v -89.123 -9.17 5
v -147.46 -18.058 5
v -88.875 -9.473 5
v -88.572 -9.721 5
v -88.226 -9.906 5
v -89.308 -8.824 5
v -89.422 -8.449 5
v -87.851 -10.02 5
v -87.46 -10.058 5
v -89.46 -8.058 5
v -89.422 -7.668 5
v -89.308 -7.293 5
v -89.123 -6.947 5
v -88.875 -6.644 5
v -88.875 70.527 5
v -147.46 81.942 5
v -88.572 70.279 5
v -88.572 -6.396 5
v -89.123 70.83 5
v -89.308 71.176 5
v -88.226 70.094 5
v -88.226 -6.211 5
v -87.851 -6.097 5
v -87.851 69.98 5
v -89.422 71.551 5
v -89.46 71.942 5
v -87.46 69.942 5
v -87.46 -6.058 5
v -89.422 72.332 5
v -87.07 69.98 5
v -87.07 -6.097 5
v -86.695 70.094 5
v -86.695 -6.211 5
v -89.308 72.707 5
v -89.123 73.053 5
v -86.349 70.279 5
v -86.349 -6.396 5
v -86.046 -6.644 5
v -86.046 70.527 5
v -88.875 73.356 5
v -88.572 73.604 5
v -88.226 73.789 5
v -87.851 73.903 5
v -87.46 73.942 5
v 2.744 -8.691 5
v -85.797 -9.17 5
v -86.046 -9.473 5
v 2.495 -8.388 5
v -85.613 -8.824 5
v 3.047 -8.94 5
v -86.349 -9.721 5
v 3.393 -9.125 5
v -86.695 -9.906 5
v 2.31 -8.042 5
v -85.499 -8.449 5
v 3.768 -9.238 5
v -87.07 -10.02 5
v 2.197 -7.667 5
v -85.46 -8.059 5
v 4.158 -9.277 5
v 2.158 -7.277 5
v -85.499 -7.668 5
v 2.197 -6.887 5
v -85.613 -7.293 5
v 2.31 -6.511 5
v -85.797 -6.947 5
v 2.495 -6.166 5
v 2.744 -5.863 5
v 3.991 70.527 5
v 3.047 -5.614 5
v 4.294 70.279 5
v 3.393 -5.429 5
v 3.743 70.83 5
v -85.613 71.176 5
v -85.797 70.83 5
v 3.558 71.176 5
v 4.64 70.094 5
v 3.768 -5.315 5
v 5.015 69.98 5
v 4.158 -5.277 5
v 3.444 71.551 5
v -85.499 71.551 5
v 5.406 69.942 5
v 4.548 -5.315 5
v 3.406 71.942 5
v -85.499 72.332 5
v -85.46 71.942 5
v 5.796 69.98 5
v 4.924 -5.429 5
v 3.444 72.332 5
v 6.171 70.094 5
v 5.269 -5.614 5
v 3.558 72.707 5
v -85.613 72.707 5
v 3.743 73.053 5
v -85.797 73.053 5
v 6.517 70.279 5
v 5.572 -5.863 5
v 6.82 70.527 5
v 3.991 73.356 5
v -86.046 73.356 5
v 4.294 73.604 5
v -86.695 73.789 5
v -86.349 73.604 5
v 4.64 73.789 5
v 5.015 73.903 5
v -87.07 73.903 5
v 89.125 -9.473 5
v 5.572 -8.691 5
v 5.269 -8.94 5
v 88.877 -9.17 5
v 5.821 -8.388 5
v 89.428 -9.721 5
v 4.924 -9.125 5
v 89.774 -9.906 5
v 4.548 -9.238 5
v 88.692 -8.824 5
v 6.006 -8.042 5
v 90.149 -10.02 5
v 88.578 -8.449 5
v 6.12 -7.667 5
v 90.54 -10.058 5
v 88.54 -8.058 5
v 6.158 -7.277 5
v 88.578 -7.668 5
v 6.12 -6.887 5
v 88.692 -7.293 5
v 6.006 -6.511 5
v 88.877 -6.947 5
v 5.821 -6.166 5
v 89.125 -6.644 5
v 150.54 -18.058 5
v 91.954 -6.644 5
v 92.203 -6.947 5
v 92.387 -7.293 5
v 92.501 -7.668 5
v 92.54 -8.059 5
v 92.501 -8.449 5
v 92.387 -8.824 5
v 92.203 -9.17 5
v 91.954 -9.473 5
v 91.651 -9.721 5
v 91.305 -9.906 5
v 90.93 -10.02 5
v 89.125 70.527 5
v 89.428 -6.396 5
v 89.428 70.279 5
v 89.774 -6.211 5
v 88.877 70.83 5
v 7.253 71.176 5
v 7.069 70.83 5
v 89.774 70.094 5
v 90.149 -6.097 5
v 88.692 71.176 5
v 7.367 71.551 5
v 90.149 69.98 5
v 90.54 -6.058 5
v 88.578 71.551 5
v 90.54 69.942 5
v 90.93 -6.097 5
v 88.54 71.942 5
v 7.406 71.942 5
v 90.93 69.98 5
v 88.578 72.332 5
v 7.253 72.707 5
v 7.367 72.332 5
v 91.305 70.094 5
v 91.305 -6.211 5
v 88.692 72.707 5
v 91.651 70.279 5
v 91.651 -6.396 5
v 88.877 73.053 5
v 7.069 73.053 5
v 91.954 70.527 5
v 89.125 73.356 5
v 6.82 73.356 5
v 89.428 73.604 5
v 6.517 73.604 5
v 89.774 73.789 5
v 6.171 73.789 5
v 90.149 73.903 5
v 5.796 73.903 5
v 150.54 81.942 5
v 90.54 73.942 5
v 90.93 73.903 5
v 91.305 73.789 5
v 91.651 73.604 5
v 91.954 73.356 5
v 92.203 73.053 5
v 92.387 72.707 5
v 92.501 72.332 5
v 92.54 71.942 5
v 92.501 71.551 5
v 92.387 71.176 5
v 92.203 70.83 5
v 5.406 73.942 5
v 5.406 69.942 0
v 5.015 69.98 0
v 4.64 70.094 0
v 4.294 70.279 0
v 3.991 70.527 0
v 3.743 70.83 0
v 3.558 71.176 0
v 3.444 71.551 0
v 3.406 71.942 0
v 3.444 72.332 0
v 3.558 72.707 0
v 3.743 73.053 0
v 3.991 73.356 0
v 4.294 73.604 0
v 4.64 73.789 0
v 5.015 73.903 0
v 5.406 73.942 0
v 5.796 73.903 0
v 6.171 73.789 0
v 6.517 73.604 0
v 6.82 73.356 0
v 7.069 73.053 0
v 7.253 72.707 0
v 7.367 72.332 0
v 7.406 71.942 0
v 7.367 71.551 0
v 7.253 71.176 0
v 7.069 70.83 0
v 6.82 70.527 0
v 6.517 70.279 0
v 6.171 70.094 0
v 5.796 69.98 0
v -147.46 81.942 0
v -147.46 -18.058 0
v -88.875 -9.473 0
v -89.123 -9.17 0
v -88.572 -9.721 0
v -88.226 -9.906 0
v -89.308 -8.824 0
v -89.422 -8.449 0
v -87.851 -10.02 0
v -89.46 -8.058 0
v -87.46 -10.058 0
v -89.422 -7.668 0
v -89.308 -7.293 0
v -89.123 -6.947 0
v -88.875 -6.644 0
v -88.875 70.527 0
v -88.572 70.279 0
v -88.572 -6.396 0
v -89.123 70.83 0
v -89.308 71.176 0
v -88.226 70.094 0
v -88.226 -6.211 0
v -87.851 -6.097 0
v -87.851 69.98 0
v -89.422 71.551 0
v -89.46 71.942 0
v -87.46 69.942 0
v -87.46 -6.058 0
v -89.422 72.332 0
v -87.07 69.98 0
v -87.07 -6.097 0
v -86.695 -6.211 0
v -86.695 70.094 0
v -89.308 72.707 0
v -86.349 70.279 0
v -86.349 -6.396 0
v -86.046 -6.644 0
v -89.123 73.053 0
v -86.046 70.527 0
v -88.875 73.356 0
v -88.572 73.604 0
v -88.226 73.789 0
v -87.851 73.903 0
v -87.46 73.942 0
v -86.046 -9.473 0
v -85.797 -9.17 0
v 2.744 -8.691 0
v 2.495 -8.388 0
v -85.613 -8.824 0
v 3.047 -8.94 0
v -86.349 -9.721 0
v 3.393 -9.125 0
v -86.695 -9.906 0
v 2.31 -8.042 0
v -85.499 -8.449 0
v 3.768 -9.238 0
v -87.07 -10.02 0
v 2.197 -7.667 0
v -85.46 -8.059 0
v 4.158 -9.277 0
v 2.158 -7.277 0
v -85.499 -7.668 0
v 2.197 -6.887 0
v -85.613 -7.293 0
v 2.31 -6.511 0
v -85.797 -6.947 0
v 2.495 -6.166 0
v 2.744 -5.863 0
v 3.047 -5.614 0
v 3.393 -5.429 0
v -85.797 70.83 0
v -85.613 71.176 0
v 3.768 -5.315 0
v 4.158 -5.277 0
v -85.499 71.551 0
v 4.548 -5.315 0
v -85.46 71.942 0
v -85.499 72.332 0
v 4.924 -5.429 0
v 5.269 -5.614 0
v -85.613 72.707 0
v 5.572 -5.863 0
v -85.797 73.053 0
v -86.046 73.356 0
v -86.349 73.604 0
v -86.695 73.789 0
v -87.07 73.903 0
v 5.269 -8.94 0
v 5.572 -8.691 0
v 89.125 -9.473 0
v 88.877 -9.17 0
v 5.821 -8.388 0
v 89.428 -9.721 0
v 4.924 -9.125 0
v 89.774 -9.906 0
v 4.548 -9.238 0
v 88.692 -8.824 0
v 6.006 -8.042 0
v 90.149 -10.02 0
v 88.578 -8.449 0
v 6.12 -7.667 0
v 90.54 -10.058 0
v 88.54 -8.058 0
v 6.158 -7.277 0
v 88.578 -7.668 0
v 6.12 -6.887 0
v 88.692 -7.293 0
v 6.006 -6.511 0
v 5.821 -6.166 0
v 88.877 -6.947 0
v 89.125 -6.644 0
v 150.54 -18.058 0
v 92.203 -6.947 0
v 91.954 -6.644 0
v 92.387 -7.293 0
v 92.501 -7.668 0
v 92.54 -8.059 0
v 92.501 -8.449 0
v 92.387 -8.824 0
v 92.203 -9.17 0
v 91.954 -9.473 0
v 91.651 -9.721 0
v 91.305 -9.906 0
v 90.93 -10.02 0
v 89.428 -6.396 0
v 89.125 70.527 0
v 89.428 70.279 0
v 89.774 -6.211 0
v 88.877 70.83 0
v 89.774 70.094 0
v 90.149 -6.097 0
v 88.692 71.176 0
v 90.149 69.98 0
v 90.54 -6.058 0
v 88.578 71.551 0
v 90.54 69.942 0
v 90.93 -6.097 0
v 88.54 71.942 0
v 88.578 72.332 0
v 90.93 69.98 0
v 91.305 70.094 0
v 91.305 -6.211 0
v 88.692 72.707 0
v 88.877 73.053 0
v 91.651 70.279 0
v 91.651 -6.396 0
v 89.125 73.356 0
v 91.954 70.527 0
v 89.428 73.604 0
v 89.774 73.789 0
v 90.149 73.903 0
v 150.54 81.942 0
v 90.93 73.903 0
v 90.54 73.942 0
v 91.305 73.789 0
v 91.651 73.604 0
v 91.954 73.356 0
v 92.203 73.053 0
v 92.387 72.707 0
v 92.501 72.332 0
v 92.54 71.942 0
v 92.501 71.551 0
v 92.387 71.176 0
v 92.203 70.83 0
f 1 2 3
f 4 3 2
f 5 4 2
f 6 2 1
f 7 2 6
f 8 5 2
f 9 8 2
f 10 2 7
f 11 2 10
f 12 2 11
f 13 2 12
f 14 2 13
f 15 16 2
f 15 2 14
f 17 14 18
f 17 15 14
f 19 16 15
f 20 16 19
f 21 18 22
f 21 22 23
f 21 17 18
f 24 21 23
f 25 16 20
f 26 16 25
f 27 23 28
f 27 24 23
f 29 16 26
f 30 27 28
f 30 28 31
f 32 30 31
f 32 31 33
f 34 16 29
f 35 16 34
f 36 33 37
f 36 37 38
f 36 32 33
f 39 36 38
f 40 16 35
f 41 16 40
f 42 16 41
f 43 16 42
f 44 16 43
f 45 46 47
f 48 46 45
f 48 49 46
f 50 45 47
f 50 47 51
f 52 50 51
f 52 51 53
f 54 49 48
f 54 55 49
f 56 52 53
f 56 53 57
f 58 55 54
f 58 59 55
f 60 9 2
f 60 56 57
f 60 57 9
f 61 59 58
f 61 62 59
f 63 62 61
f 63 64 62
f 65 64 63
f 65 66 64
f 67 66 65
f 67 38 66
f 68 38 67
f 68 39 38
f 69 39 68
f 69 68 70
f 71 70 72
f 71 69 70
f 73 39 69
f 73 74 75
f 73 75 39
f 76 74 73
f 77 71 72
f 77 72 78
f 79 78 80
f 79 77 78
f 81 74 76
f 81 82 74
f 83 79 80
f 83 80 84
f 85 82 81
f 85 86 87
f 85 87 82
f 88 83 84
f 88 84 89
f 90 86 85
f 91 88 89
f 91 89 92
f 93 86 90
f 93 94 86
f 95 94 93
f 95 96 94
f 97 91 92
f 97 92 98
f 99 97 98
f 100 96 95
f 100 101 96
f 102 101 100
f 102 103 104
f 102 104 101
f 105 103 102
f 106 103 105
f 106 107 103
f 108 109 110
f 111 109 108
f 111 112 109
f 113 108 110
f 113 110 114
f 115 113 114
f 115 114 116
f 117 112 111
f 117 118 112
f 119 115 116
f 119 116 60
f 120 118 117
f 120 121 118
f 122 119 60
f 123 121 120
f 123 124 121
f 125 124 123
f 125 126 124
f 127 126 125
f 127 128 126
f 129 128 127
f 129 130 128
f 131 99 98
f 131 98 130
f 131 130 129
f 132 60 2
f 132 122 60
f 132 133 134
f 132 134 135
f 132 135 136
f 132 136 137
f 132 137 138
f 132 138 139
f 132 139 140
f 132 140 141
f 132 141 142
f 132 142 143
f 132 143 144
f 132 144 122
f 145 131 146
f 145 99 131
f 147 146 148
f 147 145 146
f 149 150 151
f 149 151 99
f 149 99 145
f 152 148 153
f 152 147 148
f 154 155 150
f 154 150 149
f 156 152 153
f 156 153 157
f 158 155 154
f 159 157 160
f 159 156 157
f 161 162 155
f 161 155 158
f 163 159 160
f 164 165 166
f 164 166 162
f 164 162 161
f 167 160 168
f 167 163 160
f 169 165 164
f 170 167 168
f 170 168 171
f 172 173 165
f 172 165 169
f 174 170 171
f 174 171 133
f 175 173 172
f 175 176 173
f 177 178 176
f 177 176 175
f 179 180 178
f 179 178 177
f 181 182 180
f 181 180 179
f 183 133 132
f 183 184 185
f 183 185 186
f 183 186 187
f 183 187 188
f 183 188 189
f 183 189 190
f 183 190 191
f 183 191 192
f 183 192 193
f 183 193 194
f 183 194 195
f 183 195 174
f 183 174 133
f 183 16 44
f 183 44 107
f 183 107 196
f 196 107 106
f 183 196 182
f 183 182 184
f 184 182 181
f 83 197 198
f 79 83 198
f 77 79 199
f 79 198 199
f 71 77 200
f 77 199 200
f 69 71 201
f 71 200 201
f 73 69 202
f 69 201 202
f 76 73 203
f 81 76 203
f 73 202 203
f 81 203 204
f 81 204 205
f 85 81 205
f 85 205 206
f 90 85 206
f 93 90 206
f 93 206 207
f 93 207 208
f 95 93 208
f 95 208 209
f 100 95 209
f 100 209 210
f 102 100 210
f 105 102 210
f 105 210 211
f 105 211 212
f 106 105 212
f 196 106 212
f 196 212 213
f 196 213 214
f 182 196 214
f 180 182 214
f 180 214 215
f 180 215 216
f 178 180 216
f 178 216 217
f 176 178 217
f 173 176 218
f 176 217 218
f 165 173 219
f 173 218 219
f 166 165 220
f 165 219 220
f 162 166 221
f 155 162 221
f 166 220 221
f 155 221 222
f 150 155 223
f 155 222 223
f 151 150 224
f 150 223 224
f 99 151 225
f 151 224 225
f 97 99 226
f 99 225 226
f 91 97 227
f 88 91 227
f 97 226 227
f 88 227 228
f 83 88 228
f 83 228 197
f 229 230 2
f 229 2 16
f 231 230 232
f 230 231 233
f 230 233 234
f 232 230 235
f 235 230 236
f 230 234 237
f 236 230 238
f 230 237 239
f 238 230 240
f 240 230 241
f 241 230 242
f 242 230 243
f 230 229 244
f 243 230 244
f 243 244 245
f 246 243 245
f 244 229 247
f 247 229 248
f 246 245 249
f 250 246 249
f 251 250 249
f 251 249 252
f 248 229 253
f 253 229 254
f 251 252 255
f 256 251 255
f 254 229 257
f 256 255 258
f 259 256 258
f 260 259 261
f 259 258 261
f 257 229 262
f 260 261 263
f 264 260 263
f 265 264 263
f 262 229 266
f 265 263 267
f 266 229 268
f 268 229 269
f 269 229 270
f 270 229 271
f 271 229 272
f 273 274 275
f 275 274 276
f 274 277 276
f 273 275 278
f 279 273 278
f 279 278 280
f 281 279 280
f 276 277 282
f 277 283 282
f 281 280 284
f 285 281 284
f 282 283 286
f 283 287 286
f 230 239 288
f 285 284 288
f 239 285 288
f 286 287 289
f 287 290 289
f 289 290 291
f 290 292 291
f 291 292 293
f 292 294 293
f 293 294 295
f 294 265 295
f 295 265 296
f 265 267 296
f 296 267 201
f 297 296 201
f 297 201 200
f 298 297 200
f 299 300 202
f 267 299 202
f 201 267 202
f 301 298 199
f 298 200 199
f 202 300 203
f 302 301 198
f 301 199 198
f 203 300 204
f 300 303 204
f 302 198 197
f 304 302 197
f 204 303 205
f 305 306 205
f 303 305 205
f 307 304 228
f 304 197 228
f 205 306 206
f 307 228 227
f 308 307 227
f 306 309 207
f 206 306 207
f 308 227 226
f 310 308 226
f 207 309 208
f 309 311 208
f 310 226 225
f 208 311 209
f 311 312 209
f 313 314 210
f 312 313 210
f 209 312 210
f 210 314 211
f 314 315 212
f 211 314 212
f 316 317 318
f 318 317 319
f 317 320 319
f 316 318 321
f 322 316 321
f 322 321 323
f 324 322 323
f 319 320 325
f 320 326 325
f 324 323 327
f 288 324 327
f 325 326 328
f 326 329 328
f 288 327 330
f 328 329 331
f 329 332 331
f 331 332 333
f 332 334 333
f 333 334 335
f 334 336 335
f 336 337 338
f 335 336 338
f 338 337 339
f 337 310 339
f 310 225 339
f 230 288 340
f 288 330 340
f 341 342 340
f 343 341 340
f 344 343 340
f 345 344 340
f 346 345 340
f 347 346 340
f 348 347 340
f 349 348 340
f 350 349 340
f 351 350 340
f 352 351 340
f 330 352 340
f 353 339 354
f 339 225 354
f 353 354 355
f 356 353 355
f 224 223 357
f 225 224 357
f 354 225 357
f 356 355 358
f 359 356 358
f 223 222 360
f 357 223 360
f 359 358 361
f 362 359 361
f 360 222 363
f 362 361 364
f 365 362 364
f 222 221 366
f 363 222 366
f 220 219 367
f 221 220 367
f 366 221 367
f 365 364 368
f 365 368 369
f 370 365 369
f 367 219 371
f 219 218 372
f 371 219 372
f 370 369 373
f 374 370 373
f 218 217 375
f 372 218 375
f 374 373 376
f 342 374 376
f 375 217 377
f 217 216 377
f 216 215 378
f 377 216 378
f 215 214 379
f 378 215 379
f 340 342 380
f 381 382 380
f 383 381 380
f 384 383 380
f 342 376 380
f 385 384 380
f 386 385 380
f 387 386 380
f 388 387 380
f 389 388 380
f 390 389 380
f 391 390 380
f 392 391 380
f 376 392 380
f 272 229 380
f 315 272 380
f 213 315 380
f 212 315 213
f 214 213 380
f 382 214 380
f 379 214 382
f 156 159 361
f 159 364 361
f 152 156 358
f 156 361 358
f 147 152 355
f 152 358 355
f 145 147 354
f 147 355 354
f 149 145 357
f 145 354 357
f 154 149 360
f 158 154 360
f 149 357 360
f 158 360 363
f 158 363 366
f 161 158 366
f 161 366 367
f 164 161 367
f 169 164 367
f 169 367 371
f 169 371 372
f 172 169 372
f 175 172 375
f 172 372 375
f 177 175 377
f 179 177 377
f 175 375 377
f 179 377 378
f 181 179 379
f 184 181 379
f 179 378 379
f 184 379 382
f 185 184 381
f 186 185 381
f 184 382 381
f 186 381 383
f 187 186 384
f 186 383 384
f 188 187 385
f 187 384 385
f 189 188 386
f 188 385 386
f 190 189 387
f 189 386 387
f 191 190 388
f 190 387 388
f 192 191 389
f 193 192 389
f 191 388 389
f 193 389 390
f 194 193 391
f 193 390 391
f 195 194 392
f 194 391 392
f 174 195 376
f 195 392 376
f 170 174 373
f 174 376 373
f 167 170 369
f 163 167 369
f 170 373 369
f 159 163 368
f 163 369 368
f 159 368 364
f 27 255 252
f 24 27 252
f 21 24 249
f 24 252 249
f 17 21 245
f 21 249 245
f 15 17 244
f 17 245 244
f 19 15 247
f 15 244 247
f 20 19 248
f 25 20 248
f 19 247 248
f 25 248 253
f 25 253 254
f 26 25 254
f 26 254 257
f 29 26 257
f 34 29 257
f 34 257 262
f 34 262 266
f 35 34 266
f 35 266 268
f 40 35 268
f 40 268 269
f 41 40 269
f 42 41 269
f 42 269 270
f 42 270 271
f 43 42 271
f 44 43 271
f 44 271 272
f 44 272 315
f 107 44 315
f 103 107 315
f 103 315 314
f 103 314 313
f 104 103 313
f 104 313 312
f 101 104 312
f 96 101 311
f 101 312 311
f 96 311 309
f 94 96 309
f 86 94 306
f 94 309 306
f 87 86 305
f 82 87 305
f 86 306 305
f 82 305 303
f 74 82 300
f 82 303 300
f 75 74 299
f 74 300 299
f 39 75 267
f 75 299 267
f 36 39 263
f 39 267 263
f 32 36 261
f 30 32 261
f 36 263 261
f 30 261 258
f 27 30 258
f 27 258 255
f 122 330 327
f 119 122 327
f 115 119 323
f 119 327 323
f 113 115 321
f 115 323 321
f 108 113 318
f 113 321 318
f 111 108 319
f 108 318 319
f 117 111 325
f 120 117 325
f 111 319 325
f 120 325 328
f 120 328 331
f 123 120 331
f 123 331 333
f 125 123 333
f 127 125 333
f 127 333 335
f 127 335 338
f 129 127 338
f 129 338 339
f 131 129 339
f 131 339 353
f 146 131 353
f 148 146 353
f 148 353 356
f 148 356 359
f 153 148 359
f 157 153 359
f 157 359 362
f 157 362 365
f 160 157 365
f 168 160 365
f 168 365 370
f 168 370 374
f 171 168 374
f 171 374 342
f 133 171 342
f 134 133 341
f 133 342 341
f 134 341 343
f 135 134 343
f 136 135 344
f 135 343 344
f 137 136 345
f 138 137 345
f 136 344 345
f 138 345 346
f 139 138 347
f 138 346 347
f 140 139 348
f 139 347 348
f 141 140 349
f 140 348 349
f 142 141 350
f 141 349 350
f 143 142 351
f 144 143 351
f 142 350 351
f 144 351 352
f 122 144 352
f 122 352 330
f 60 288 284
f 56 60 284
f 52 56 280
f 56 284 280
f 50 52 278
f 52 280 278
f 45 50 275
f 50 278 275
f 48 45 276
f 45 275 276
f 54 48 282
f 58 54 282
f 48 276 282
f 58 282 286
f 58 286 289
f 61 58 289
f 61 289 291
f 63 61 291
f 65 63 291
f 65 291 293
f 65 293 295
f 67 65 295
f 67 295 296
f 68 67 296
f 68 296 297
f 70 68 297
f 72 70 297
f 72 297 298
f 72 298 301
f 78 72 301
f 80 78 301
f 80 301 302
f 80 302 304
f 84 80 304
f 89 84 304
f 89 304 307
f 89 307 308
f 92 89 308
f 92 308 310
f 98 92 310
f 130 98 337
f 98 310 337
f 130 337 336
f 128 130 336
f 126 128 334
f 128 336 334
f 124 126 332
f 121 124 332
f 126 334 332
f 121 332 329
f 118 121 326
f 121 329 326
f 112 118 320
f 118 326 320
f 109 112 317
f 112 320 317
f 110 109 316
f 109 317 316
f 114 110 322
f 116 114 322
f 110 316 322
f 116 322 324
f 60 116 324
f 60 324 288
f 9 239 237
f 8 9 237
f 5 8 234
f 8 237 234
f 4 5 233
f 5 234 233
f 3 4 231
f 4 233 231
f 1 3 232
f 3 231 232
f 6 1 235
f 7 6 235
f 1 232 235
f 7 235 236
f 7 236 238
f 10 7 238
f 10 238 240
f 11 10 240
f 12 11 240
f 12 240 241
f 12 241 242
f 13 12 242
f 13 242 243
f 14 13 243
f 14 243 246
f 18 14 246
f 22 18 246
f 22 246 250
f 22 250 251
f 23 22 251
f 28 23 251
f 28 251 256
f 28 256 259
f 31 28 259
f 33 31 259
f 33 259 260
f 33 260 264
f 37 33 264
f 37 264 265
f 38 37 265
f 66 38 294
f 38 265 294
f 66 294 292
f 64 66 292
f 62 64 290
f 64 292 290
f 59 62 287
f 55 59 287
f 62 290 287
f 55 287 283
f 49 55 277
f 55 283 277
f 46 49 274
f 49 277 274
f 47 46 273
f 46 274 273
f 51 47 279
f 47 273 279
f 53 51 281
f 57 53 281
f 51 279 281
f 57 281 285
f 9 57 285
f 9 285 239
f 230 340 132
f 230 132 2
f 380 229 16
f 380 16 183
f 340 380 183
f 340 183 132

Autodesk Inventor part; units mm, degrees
ref_plane "YZ Plane" through (0, 0, 0) normal (1, 0, 0) x (0, 1, 0)
ref_plane "XZ Plane" through (0, 0, 0) normal (0, 1, 0) x (-1, 0, 0)
ref_plane "XY Plane" through (0, 0, 0) normal (0, 0, 1) x (1, 0, 0)
sketch "Sketch1" plane through (0, 0, 0) normal (0, 0, 1) x (1, 0, 0)
  line L0 (-147.4604, 81.9415) -> (150.5396, 81.9415)
  line L1 (150.5396, 81.9415) -> (150.5396, -18.0585)
  line L2 (150.5396, -18.0585) -> (-147.4604, -18.0585)
  line L3 (-147.4604, -18.0585) -> (-147.4604, 81.9415)
  point P0 (0, 0)
extrude "Extrusion1" add sketch "Sketch1" along normal blind 5
sketch "Sketch2" plane through (0, 0, 5) normal (0, 0, 1) x (1, 0, 0)
  line L0 (150.5396, 81.9415) -> (-147.4604, 81.9415) projected
  line L1 (-147.4604, 81.9415) -> (-87.4604, 81.9415)
  line L2 (-87.4604, 81.9415) -> (-147.4604, 81.9415)
  line L3 (-147.4604, 81.9415) -> (-147.4604, 71.9415)
  line L4 (-147.4604, 81.9415) -> (-147.4604, -18.0585) projected
  line L5 (-147.4604, 71.9415) -> (-147.4604, 76.9415)
  line L6 (-87.4604, 81.9415) -> (-87.4604, 71.9415)
  line L7 (-87.4604, 71.9415) -> (-84.9499, 65.8304)
  point P0 (0, 0)
  dimension "d4" = 60
  dimension "d5" = 10
  dimension "d6" = 10
hole "Hole1" at (-87.4604, 71.9415, 5) direction (0, 0, -1) diameter 4 depth 6 tip angle 118
sketch "Sketch3" plane through (0, 0, 5) normal (0, 0, 1) x (1, 0, 0)
  line L0 (150.5396, 81.9415) -> (150.5396, -18.0585) projected
  line L1 (150.5396, 81.9415) -> (90.5396, 81.9415)
  line L2 (-147.4604, 81.9415) -> (150.5396, 81.9415) projected
  line L3 (90.5396, 81.9415) -> (132.2292, 81.9415)
  line L4 (90.5396, 81.9415) -> (90.5396, 71.9415)
  line L5 (90.5396, 71.9415) -> (90.5396, 66.7383)
  point P0 (0, 0)
  dimension "d14" = 60
  dimension "d15" = 10
hole "Hole2" at (90.5396, 71.9415, 5) direction (0, 0, -1) diameter 4 depth 6 tip angle 118
sketch "Sketch4" plane through (0, 0, 5) normal (0, 0, 1) x (1, 0, 0)
  line L0 (150.5396, -18.0585) -> (-147.4604, -18.0585) projected
  line L1 (-147.4604, -18.0585) -> (59852.5396, -18.0585)
  line L2 (-147.4604, -18.0585) -> (-147.4604, 81.9415) projected
  line L3 (59852.5396, -18.0585) -> (-147.4604, -18.0585)
  line L4 (-147.4604, -18.0585) -> (-87.4604, -18.0585)
  line L5 (-87.4604, -18.0585) -> (-147.4604, -18.0585)
  line L6 (-87.4604, -18.0585) -> (-87.4604, -8.0585)
  line L7 (-87.4604, -8.0585) -> (-87.4604, -4.3661)
  point P0 (0, 0)
  dimension "d23" = 60000
  dimension "d24" = 60
  dimension "d25" = 10
hole "Hole3" at (-87.4604, -8.0585, 5) direction (0, 0, -1) diameter 4 depth 6 tip angle 118
sketch "Sketch5" plane through (0, 0, 5) normal (0, 0, 1) x (1, 0, 0)
  line L0 (150.5396, 81.9415) -> (150.5396, -18.0585) projected
  line L1 (150.5396, -18.0585) -> (90.5396, -18.0585)
  line L2 (150.5396, -18.0585) -> (-147.4604, -18.0585) projected
  line L3 (90.5396, -18.0585) -> (90.5396, -8.0585)
  line L4 (90.5396, -8.0585) -> (90.5396, -4.7819)
  point P0 (0, 0)
  dimension "d33" = 60
  dimension "d34" = 10
hole "Hole4" at (90.5396, -8.0585, 5) direction (0, 0, -1) diameter 4 depth 6 tip angle 118
sketch "Sketch6" plane through (0, 0, 5) normal (0, 0, 1) x (1, 0, 0)
  circle A0 centre (-87.4604, 71.9415) radius 2 projected
  line L0 (-87.4604, 71.9415) -> (5.4056, 71.9415)
  line L1 (5.4056, 71.9415) -> (-84.5944, 71.9415)
  line L2 (-84.5944, 71.9415) -> (5.4056, 71.9415)
  point P0 (0, 0)
  dimension "d42" = 90
hole "Hole5" at (5.4056, 71.9415, 5) direction (0, 0, -1) diameter 4 depth 6 tip angle 118
sketch "Sketch7" plane through (0, 0, 5) normal (0, 0, 1) x (1, 0, 0)
  circle A0 centre (-87.4604, -8.0585) radius 2 projected
  line L0 (-87.4604, -10.0585) -> (2.9107, -10.0585)
  line L1 (2.9107, -10.0585) -> (-87.0893, -10.0585)
  point P0 (0, 0)
  dimension "d50" = 90
sketch "Sketch8" plane through (0, 0, 5) normal (0, 0, 1) x (1, 0, 0)
  point P0 (0, 0)
  point P1 (4.1582, -7.2768)
hole "Hole6" at (4.1582, -7.2768, 5) direction (0, 0, -1) diameter 4 depth 6 tip angle 118
properties part number "acrilesheet_base"
